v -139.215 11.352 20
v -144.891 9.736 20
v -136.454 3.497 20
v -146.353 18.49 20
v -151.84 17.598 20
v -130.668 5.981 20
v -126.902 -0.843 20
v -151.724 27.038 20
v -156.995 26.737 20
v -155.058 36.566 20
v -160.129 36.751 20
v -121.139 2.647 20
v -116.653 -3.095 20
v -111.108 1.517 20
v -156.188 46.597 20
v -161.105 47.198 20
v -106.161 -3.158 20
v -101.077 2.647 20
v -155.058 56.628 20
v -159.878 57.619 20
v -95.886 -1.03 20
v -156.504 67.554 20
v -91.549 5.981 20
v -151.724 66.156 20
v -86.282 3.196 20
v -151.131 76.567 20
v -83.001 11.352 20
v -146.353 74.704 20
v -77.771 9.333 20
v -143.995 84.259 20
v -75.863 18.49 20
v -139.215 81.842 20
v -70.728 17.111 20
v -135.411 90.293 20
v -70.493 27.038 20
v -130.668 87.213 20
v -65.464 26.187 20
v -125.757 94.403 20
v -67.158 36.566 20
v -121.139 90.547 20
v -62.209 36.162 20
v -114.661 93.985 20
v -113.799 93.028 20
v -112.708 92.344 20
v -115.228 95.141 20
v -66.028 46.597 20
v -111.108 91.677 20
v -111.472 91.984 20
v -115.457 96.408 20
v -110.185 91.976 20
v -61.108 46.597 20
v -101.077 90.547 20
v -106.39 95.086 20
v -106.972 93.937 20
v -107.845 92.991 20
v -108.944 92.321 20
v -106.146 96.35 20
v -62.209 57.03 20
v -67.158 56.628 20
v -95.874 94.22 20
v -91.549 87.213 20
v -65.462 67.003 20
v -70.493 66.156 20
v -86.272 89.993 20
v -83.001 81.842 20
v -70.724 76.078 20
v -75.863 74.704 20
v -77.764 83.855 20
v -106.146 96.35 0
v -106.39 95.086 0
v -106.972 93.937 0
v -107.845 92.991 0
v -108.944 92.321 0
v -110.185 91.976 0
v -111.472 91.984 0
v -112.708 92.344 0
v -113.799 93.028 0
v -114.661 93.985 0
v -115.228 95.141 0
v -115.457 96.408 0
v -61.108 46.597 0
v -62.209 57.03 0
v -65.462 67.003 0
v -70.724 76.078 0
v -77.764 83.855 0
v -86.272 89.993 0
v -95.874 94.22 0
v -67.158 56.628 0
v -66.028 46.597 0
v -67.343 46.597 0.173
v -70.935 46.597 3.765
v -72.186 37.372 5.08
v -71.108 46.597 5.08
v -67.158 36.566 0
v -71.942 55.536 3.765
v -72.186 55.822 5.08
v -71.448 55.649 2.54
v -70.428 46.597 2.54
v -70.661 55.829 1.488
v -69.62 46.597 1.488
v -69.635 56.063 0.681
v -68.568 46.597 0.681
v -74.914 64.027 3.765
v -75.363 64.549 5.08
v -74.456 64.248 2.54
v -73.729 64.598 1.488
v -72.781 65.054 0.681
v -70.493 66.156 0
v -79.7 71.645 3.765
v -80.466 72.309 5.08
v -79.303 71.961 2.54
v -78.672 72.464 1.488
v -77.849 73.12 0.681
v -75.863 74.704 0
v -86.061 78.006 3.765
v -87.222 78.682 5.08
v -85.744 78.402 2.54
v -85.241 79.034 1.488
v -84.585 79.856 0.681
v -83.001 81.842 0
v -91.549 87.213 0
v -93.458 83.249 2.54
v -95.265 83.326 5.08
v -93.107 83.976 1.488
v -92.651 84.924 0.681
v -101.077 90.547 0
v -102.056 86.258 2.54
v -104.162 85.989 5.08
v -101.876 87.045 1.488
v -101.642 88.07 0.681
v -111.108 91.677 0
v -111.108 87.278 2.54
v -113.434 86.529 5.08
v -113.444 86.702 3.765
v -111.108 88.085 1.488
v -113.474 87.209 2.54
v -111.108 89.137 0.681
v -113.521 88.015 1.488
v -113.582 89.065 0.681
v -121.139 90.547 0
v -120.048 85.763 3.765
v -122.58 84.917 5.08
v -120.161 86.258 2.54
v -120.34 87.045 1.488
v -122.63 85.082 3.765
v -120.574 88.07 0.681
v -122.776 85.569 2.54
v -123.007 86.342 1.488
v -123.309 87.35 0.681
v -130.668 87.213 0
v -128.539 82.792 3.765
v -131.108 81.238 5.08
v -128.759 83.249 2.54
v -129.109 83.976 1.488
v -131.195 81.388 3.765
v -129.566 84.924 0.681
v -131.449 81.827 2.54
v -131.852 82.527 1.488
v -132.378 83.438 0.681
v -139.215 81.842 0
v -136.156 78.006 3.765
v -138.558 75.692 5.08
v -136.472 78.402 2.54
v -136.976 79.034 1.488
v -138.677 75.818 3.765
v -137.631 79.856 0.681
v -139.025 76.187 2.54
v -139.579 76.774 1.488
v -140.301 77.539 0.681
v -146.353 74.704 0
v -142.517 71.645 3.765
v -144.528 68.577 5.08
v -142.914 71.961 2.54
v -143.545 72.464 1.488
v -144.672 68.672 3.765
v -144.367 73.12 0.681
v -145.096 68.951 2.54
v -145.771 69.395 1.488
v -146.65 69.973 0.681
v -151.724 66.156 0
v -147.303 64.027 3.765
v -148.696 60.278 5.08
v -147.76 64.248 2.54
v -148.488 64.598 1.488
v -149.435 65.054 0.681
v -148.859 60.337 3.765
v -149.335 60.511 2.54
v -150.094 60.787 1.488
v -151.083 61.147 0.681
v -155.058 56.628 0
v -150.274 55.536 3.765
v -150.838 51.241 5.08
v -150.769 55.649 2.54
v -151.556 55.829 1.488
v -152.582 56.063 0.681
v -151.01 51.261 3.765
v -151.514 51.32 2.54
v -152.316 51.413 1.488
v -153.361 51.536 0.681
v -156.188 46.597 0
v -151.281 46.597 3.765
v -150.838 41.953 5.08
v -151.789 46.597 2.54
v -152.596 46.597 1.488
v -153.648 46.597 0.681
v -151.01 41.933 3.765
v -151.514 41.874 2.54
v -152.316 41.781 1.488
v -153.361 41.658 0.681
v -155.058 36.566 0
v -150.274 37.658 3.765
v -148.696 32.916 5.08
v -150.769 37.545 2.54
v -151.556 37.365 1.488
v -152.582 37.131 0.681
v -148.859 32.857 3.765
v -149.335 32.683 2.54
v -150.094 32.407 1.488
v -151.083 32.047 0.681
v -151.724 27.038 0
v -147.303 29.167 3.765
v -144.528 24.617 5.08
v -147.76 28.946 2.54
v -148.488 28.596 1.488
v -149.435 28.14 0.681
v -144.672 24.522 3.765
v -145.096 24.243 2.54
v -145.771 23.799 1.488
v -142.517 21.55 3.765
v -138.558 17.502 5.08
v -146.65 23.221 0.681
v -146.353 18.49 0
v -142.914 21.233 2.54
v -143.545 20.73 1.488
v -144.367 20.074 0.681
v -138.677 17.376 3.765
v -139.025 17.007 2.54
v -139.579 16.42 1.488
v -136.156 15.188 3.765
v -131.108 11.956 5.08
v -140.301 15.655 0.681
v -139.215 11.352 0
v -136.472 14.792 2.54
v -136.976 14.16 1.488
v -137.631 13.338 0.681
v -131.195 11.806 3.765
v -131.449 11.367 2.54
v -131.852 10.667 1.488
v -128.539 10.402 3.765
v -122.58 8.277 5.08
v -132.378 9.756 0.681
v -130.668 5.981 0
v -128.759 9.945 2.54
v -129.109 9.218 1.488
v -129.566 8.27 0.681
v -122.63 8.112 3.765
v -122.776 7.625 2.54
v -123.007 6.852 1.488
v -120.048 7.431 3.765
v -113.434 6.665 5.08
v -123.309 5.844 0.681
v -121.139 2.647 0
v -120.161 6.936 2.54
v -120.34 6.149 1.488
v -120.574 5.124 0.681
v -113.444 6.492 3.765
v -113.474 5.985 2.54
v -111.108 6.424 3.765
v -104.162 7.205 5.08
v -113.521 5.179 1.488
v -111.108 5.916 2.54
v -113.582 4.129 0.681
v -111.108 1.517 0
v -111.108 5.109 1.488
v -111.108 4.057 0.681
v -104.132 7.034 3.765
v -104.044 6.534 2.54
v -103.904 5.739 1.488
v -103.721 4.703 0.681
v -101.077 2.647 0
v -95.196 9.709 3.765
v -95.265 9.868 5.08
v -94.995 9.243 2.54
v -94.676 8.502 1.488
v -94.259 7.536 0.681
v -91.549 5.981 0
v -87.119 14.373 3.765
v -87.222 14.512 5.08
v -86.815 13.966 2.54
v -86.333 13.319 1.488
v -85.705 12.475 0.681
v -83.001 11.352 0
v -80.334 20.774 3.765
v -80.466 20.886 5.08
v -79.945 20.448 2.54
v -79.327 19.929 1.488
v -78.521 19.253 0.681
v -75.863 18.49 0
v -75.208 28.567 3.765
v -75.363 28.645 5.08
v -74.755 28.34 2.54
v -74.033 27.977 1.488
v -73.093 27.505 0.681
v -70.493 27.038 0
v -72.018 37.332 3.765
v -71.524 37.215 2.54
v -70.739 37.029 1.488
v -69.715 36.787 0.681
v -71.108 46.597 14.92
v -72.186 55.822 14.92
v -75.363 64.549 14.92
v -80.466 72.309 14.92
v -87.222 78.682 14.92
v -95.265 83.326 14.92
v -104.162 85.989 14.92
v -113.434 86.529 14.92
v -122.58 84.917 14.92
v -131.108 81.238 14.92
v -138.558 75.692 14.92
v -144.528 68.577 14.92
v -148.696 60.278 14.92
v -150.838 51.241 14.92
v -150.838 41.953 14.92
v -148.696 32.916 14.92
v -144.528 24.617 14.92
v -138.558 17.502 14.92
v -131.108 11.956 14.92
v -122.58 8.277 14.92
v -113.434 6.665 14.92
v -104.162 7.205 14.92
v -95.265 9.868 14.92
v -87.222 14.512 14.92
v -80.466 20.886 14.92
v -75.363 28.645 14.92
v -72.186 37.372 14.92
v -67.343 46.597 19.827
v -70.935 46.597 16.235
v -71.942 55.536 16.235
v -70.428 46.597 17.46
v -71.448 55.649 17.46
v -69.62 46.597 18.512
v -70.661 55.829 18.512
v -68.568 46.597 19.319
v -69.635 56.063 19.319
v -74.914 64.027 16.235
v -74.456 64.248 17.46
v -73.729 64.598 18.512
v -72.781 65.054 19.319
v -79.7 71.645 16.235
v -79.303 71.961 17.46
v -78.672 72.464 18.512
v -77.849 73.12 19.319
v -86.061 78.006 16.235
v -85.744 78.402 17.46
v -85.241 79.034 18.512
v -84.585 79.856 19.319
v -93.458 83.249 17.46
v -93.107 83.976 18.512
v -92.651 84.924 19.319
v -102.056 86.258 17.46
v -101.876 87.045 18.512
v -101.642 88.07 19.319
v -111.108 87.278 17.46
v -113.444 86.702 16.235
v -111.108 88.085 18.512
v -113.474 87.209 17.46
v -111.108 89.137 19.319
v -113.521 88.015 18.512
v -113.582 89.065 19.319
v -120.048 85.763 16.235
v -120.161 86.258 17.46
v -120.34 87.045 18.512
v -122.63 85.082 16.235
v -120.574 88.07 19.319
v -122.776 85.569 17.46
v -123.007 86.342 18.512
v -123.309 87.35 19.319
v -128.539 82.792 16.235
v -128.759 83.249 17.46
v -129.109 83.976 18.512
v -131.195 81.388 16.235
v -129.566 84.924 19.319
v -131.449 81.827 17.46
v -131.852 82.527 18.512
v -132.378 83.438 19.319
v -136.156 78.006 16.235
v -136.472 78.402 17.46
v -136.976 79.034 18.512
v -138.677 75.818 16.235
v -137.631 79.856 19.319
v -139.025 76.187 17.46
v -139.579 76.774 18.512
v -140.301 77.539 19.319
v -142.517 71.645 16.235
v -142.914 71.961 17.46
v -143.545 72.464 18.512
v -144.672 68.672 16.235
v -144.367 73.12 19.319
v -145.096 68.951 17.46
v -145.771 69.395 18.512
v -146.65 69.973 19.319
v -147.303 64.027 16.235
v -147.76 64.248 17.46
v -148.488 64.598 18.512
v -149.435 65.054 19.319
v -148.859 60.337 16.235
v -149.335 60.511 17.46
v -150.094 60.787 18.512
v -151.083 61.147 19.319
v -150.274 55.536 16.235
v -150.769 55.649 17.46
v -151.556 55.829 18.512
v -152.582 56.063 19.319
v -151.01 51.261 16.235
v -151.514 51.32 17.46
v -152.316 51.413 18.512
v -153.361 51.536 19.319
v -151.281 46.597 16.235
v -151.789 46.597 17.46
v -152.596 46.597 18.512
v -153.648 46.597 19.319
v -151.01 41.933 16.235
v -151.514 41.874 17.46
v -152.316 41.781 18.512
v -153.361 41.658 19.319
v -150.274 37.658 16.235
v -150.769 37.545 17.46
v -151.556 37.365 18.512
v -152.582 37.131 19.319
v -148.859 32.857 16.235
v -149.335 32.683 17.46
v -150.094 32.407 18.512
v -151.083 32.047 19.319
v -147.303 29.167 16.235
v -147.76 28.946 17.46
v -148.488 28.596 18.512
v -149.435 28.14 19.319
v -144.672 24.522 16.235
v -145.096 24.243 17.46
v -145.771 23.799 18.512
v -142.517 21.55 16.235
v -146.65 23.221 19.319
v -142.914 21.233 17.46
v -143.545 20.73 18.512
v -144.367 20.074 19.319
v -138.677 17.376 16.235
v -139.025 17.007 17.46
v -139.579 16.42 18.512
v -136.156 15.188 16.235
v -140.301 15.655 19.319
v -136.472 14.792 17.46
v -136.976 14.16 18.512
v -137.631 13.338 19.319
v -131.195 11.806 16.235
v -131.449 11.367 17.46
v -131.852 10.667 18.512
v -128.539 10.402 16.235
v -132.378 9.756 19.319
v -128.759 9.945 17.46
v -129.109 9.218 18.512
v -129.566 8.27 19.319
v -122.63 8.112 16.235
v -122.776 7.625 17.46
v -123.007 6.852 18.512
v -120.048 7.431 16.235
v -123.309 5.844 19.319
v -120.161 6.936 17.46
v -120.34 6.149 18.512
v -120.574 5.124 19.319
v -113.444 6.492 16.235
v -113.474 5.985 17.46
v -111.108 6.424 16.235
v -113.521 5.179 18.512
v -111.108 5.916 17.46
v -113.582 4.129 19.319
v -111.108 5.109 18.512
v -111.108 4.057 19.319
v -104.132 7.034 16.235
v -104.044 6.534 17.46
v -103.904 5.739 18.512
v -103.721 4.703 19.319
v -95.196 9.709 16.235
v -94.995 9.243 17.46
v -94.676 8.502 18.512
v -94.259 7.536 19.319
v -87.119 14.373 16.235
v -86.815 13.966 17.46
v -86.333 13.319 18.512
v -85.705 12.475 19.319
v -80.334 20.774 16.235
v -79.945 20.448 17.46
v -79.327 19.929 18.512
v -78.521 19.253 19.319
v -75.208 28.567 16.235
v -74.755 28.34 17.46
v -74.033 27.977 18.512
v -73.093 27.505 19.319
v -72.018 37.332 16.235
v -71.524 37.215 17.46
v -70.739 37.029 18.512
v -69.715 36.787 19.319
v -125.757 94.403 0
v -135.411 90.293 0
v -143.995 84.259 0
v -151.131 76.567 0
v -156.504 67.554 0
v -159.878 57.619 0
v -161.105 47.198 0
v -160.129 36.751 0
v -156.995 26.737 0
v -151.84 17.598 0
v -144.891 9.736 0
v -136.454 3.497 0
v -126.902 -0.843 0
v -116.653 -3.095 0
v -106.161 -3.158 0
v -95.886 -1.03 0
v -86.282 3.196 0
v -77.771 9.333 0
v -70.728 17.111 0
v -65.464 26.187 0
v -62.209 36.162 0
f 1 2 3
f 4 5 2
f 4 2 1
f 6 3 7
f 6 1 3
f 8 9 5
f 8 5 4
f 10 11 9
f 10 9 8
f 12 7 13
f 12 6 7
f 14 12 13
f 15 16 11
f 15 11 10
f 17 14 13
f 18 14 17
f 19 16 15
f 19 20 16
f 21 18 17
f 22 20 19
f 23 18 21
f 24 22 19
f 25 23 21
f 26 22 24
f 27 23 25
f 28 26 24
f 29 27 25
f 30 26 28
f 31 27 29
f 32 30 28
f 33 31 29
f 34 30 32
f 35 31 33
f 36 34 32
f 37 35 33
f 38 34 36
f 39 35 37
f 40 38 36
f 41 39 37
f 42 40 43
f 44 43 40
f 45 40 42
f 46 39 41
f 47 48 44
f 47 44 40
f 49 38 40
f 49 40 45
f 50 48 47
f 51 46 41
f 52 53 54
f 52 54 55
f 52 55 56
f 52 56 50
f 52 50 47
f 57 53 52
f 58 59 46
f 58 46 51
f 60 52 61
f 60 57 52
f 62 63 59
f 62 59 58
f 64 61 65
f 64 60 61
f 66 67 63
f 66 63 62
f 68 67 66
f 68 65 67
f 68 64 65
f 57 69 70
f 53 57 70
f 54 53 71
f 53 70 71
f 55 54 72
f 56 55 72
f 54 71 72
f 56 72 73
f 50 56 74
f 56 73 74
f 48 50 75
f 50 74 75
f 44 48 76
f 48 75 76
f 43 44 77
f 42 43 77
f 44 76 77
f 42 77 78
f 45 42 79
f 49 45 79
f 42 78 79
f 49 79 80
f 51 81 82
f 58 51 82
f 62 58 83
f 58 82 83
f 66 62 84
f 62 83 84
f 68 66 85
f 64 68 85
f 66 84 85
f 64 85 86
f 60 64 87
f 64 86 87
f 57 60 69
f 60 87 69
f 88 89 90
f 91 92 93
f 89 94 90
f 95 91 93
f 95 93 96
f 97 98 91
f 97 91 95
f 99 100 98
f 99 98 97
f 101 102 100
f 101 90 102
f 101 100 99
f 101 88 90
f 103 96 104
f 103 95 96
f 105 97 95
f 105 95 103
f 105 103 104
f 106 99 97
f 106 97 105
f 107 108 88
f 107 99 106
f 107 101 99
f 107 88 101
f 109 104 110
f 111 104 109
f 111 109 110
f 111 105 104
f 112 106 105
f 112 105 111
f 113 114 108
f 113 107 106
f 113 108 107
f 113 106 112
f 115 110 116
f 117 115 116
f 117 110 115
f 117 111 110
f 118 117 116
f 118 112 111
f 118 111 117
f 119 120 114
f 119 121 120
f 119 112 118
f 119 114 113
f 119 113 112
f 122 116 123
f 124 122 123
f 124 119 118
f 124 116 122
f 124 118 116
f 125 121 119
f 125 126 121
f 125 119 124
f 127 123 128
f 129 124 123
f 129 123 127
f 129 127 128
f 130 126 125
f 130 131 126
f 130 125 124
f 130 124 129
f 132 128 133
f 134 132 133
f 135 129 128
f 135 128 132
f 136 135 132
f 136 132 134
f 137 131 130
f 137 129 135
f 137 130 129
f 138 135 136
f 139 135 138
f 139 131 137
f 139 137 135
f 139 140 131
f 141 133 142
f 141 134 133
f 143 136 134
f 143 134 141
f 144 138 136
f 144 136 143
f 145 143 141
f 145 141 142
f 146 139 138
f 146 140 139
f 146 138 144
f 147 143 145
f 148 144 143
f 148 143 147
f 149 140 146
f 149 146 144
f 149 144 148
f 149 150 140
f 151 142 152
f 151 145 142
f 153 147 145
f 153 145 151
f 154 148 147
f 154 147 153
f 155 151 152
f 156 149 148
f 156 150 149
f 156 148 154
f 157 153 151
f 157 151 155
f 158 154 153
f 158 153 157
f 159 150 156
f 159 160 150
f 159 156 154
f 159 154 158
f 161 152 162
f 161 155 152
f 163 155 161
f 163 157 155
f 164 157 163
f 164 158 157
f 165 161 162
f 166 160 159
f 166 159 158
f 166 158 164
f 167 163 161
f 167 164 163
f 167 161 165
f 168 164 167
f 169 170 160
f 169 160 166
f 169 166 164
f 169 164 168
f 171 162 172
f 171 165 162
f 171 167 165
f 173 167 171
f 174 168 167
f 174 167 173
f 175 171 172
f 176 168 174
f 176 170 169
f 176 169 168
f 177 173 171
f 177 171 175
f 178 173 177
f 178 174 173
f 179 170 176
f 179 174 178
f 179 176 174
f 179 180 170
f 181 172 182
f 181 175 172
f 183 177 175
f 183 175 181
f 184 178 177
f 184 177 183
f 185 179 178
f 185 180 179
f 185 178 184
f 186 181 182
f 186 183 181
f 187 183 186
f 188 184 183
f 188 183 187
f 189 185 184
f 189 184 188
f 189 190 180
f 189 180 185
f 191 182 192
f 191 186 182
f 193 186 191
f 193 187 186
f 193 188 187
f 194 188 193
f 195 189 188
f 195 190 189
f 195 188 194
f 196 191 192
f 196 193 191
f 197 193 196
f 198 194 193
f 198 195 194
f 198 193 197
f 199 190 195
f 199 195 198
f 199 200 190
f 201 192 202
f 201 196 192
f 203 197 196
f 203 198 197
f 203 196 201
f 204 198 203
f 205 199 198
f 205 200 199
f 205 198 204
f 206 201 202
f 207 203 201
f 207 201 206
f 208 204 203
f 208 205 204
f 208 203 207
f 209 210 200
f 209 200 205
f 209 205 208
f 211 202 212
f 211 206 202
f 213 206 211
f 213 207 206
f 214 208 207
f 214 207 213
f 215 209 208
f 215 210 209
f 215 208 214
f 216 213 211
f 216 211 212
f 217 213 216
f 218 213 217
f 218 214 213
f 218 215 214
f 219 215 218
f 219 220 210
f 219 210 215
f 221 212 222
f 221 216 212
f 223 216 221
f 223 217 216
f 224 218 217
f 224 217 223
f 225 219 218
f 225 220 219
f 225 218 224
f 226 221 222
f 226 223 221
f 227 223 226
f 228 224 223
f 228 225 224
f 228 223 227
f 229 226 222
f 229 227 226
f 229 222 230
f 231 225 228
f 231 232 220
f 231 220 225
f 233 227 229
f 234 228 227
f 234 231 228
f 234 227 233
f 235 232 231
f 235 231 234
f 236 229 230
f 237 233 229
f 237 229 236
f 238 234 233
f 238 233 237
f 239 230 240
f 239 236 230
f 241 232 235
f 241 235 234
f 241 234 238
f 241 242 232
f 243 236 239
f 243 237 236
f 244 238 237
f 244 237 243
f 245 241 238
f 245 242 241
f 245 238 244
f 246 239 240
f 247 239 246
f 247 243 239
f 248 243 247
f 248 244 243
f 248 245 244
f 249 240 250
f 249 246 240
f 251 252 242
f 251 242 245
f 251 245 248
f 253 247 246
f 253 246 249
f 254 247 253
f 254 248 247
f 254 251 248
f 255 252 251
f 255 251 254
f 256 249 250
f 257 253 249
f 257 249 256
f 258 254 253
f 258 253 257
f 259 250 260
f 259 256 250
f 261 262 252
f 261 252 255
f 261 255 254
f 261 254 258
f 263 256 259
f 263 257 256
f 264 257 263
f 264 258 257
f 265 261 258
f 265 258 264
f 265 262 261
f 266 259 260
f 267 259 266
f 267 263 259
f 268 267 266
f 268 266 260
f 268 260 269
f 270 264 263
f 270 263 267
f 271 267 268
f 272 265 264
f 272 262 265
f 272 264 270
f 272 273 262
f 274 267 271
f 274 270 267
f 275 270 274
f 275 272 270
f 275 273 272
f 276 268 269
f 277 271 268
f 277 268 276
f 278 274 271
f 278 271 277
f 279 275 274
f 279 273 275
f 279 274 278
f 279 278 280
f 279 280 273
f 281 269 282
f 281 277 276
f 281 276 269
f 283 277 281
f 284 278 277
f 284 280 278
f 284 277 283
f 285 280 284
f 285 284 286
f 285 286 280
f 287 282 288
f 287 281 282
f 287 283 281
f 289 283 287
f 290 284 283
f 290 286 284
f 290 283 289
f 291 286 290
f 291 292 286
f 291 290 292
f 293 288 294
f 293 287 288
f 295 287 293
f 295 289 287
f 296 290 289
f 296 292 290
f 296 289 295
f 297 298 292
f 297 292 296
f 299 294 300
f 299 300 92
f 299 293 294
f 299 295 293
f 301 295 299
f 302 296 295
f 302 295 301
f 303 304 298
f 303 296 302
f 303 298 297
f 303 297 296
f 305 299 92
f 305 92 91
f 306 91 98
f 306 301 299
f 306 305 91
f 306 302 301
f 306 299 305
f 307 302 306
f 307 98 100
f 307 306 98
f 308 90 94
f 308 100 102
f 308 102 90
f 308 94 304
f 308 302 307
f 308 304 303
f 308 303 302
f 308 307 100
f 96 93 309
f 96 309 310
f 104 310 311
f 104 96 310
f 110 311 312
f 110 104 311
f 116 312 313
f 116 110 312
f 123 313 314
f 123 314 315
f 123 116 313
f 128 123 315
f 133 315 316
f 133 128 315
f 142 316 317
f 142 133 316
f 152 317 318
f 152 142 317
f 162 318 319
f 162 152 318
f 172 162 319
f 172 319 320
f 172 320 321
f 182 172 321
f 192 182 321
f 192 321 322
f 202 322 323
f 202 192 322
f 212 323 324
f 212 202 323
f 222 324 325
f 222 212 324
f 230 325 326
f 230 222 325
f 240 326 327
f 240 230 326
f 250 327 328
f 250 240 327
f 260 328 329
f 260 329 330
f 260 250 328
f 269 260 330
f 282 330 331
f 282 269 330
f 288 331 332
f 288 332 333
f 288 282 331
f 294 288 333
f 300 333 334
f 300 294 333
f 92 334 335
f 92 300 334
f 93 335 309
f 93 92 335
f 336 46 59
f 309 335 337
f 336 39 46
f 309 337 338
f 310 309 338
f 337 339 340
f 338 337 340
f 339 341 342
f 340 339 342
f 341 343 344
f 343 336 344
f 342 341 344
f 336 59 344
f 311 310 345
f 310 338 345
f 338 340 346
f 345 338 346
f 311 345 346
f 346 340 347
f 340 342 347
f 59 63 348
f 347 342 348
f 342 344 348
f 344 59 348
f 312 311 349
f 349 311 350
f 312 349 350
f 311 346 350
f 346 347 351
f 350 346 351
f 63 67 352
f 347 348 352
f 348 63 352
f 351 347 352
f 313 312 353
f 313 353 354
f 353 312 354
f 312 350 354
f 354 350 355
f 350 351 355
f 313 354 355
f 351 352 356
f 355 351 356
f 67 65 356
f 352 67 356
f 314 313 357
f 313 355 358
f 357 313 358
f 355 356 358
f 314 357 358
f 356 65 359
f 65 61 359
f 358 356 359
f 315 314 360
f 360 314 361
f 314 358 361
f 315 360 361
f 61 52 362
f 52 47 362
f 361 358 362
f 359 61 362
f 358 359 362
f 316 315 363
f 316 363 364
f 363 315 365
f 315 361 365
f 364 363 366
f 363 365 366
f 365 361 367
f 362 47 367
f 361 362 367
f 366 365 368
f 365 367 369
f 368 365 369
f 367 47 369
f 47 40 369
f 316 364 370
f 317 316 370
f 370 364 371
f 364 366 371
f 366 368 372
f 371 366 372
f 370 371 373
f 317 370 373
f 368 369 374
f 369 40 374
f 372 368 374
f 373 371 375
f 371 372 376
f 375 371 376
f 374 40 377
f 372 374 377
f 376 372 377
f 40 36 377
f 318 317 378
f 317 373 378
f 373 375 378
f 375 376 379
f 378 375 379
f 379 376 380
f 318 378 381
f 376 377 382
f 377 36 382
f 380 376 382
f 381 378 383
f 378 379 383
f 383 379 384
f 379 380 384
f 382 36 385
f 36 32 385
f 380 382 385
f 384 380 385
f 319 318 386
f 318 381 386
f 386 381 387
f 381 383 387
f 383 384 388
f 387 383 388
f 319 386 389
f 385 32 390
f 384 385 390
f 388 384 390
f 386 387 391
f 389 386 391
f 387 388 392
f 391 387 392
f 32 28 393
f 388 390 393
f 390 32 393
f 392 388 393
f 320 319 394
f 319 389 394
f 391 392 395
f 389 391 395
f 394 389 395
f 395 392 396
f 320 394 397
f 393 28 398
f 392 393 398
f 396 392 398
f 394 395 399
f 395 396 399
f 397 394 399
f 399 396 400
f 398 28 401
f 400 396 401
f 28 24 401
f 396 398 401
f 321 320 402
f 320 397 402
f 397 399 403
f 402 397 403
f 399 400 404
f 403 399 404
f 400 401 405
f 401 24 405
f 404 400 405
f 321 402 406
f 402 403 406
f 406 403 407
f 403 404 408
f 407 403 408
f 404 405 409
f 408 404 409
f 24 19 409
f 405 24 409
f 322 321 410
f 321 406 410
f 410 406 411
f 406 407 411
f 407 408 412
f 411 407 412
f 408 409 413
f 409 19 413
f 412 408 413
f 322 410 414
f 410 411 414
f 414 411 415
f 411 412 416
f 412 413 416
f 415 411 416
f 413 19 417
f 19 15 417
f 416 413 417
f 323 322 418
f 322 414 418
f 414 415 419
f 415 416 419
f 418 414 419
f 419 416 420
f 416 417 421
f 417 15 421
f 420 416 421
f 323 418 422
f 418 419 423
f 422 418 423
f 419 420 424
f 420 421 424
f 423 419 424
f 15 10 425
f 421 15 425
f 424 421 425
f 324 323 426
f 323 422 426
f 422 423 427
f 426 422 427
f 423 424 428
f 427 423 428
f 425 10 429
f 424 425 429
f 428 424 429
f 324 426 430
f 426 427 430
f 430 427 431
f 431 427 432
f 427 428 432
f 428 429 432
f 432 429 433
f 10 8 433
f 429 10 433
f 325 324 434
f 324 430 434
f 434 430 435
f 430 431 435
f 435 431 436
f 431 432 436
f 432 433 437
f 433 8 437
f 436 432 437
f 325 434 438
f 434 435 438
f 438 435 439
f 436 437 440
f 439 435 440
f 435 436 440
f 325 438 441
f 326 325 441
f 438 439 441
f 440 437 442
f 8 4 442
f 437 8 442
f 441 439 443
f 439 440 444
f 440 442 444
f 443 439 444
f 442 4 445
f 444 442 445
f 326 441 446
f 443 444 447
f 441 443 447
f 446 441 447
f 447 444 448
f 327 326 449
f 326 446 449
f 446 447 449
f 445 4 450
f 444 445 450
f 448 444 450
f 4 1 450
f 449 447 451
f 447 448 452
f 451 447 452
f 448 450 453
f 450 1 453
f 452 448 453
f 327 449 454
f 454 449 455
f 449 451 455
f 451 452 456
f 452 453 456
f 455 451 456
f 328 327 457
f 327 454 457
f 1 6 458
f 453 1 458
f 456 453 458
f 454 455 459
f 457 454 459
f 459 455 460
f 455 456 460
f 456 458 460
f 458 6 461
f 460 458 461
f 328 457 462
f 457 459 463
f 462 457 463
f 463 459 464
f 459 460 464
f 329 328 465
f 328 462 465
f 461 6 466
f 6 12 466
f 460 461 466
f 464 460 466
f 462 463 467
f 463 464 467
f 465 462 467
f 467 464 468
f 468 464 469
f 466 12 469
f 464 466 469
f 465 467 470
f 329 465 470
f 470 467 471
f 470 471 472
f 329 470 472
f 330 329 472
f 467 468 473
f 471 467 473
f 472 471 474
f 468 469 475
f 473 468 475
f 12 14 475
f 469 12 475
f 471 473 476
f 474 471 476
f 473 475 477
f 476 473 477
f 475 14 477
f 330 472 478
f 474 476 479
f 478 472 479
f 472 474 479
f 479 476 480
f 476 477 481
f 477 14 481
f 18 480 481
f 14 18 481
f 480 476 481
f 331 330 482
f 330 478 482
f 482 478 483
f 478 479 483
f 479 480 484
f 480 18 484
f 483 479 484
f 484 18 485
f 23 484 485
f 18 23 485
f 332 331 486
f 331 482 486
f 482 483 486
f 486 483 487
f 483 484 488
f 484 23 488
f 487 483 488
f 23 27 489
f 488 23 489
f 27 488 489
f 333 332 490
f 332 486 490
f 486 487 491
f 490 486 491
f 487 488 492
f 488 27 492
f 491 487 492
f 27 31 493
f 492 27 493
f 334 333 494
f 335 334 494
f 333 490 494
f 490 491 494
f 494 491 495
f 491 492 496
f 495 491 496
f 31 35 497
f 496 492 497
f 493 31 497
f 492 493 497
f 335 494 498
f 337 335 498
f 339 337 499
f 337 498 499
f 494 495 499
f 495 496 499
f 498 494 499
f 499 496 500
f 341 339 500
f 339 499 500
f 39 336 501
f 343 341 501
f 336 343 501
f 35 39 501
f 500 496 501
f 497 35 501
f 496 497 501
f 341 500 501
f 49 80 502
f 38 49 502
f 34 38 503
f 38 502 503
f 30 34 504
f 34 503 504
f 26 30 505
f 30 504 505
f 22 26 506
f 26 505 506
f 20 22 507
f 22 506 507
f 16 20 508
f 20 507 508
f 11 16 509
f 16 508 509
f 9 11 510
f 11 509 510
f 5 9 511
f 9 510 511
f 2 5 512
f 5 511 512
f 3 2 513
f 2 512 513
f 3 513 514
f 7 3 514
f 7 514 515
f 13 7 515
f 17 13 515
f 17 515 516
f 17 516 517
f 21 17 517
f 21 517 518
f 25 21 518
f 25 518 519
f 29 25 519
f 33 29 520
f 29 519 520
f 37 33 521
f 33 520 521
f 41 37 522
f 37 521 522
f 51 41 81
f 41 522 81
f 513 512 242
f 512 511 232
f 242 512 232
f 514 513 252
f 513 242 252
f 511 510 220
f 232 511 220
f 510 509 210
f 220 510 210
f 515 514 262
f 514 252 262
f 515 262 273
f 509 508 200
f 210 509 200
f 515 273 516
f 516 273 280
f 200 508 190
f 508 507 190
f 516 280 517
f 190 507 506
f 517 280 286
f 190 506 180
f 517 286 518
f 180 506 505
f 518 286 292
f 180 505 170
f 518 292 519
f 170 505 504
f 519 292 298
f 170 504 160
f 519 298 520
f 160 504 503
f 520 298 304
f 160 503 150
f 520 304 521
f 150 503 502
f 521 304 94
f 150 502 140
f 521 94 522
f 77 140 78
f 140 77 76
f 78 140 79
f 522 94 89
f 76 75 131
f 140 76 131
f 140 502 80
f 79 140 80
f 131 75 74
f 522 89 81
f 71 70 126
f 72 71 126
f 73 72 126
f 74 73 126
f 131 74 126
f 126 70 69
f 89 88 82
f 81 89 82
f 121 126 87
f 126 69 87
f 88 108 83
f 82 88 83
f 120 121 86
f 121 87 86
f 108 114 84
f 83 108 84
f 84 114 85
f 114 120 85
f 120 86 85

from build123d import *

# Parameters (mm, degrees)
F0_R     = 40
F1_DEPTH = 20
F2_R     = 5.08
F3_R     = 5.08


with BuildPart() as f1:
    # F0 (on Top) → F1 (new body)
    with BuildSketch(Plane.XY):
        with BuildLine():
            ThreePointArc((-115.457179, 96.407526), (-144.891009, 9.736149), (-61.108229, 46.597019))
            ThreePointArc((-61.108229, 46.597019), (-74.039839, 80.151967), (-106.145609, 96.350133))
            ThreePointArc((-106.145609, 96.350133), (-110.828783, 91.935219), (-115.457179, 96.407526))
        make_face()
        with Locations((-111.108229, 46.597019)):
            Circle(F0_R, mode=Mode.SUBTRACT)
    extrude(amount=F1_DEPTH)

    # F2
    f2_edges = [f1.edges().sort_by_distance(p)[0] for p in [
        (-151.108229, 46.597019, 20),
    ]]
    fillet(f2_edges, radius=F2_R)

    # F3
    f3_edges = [f1.edges().sort_by_distance(p)[0] for p in [
        (-151.108229, 46.597019, 0),
    ]]
    fillet(f3_edges, radius=F3_R)


solid = f1.part
